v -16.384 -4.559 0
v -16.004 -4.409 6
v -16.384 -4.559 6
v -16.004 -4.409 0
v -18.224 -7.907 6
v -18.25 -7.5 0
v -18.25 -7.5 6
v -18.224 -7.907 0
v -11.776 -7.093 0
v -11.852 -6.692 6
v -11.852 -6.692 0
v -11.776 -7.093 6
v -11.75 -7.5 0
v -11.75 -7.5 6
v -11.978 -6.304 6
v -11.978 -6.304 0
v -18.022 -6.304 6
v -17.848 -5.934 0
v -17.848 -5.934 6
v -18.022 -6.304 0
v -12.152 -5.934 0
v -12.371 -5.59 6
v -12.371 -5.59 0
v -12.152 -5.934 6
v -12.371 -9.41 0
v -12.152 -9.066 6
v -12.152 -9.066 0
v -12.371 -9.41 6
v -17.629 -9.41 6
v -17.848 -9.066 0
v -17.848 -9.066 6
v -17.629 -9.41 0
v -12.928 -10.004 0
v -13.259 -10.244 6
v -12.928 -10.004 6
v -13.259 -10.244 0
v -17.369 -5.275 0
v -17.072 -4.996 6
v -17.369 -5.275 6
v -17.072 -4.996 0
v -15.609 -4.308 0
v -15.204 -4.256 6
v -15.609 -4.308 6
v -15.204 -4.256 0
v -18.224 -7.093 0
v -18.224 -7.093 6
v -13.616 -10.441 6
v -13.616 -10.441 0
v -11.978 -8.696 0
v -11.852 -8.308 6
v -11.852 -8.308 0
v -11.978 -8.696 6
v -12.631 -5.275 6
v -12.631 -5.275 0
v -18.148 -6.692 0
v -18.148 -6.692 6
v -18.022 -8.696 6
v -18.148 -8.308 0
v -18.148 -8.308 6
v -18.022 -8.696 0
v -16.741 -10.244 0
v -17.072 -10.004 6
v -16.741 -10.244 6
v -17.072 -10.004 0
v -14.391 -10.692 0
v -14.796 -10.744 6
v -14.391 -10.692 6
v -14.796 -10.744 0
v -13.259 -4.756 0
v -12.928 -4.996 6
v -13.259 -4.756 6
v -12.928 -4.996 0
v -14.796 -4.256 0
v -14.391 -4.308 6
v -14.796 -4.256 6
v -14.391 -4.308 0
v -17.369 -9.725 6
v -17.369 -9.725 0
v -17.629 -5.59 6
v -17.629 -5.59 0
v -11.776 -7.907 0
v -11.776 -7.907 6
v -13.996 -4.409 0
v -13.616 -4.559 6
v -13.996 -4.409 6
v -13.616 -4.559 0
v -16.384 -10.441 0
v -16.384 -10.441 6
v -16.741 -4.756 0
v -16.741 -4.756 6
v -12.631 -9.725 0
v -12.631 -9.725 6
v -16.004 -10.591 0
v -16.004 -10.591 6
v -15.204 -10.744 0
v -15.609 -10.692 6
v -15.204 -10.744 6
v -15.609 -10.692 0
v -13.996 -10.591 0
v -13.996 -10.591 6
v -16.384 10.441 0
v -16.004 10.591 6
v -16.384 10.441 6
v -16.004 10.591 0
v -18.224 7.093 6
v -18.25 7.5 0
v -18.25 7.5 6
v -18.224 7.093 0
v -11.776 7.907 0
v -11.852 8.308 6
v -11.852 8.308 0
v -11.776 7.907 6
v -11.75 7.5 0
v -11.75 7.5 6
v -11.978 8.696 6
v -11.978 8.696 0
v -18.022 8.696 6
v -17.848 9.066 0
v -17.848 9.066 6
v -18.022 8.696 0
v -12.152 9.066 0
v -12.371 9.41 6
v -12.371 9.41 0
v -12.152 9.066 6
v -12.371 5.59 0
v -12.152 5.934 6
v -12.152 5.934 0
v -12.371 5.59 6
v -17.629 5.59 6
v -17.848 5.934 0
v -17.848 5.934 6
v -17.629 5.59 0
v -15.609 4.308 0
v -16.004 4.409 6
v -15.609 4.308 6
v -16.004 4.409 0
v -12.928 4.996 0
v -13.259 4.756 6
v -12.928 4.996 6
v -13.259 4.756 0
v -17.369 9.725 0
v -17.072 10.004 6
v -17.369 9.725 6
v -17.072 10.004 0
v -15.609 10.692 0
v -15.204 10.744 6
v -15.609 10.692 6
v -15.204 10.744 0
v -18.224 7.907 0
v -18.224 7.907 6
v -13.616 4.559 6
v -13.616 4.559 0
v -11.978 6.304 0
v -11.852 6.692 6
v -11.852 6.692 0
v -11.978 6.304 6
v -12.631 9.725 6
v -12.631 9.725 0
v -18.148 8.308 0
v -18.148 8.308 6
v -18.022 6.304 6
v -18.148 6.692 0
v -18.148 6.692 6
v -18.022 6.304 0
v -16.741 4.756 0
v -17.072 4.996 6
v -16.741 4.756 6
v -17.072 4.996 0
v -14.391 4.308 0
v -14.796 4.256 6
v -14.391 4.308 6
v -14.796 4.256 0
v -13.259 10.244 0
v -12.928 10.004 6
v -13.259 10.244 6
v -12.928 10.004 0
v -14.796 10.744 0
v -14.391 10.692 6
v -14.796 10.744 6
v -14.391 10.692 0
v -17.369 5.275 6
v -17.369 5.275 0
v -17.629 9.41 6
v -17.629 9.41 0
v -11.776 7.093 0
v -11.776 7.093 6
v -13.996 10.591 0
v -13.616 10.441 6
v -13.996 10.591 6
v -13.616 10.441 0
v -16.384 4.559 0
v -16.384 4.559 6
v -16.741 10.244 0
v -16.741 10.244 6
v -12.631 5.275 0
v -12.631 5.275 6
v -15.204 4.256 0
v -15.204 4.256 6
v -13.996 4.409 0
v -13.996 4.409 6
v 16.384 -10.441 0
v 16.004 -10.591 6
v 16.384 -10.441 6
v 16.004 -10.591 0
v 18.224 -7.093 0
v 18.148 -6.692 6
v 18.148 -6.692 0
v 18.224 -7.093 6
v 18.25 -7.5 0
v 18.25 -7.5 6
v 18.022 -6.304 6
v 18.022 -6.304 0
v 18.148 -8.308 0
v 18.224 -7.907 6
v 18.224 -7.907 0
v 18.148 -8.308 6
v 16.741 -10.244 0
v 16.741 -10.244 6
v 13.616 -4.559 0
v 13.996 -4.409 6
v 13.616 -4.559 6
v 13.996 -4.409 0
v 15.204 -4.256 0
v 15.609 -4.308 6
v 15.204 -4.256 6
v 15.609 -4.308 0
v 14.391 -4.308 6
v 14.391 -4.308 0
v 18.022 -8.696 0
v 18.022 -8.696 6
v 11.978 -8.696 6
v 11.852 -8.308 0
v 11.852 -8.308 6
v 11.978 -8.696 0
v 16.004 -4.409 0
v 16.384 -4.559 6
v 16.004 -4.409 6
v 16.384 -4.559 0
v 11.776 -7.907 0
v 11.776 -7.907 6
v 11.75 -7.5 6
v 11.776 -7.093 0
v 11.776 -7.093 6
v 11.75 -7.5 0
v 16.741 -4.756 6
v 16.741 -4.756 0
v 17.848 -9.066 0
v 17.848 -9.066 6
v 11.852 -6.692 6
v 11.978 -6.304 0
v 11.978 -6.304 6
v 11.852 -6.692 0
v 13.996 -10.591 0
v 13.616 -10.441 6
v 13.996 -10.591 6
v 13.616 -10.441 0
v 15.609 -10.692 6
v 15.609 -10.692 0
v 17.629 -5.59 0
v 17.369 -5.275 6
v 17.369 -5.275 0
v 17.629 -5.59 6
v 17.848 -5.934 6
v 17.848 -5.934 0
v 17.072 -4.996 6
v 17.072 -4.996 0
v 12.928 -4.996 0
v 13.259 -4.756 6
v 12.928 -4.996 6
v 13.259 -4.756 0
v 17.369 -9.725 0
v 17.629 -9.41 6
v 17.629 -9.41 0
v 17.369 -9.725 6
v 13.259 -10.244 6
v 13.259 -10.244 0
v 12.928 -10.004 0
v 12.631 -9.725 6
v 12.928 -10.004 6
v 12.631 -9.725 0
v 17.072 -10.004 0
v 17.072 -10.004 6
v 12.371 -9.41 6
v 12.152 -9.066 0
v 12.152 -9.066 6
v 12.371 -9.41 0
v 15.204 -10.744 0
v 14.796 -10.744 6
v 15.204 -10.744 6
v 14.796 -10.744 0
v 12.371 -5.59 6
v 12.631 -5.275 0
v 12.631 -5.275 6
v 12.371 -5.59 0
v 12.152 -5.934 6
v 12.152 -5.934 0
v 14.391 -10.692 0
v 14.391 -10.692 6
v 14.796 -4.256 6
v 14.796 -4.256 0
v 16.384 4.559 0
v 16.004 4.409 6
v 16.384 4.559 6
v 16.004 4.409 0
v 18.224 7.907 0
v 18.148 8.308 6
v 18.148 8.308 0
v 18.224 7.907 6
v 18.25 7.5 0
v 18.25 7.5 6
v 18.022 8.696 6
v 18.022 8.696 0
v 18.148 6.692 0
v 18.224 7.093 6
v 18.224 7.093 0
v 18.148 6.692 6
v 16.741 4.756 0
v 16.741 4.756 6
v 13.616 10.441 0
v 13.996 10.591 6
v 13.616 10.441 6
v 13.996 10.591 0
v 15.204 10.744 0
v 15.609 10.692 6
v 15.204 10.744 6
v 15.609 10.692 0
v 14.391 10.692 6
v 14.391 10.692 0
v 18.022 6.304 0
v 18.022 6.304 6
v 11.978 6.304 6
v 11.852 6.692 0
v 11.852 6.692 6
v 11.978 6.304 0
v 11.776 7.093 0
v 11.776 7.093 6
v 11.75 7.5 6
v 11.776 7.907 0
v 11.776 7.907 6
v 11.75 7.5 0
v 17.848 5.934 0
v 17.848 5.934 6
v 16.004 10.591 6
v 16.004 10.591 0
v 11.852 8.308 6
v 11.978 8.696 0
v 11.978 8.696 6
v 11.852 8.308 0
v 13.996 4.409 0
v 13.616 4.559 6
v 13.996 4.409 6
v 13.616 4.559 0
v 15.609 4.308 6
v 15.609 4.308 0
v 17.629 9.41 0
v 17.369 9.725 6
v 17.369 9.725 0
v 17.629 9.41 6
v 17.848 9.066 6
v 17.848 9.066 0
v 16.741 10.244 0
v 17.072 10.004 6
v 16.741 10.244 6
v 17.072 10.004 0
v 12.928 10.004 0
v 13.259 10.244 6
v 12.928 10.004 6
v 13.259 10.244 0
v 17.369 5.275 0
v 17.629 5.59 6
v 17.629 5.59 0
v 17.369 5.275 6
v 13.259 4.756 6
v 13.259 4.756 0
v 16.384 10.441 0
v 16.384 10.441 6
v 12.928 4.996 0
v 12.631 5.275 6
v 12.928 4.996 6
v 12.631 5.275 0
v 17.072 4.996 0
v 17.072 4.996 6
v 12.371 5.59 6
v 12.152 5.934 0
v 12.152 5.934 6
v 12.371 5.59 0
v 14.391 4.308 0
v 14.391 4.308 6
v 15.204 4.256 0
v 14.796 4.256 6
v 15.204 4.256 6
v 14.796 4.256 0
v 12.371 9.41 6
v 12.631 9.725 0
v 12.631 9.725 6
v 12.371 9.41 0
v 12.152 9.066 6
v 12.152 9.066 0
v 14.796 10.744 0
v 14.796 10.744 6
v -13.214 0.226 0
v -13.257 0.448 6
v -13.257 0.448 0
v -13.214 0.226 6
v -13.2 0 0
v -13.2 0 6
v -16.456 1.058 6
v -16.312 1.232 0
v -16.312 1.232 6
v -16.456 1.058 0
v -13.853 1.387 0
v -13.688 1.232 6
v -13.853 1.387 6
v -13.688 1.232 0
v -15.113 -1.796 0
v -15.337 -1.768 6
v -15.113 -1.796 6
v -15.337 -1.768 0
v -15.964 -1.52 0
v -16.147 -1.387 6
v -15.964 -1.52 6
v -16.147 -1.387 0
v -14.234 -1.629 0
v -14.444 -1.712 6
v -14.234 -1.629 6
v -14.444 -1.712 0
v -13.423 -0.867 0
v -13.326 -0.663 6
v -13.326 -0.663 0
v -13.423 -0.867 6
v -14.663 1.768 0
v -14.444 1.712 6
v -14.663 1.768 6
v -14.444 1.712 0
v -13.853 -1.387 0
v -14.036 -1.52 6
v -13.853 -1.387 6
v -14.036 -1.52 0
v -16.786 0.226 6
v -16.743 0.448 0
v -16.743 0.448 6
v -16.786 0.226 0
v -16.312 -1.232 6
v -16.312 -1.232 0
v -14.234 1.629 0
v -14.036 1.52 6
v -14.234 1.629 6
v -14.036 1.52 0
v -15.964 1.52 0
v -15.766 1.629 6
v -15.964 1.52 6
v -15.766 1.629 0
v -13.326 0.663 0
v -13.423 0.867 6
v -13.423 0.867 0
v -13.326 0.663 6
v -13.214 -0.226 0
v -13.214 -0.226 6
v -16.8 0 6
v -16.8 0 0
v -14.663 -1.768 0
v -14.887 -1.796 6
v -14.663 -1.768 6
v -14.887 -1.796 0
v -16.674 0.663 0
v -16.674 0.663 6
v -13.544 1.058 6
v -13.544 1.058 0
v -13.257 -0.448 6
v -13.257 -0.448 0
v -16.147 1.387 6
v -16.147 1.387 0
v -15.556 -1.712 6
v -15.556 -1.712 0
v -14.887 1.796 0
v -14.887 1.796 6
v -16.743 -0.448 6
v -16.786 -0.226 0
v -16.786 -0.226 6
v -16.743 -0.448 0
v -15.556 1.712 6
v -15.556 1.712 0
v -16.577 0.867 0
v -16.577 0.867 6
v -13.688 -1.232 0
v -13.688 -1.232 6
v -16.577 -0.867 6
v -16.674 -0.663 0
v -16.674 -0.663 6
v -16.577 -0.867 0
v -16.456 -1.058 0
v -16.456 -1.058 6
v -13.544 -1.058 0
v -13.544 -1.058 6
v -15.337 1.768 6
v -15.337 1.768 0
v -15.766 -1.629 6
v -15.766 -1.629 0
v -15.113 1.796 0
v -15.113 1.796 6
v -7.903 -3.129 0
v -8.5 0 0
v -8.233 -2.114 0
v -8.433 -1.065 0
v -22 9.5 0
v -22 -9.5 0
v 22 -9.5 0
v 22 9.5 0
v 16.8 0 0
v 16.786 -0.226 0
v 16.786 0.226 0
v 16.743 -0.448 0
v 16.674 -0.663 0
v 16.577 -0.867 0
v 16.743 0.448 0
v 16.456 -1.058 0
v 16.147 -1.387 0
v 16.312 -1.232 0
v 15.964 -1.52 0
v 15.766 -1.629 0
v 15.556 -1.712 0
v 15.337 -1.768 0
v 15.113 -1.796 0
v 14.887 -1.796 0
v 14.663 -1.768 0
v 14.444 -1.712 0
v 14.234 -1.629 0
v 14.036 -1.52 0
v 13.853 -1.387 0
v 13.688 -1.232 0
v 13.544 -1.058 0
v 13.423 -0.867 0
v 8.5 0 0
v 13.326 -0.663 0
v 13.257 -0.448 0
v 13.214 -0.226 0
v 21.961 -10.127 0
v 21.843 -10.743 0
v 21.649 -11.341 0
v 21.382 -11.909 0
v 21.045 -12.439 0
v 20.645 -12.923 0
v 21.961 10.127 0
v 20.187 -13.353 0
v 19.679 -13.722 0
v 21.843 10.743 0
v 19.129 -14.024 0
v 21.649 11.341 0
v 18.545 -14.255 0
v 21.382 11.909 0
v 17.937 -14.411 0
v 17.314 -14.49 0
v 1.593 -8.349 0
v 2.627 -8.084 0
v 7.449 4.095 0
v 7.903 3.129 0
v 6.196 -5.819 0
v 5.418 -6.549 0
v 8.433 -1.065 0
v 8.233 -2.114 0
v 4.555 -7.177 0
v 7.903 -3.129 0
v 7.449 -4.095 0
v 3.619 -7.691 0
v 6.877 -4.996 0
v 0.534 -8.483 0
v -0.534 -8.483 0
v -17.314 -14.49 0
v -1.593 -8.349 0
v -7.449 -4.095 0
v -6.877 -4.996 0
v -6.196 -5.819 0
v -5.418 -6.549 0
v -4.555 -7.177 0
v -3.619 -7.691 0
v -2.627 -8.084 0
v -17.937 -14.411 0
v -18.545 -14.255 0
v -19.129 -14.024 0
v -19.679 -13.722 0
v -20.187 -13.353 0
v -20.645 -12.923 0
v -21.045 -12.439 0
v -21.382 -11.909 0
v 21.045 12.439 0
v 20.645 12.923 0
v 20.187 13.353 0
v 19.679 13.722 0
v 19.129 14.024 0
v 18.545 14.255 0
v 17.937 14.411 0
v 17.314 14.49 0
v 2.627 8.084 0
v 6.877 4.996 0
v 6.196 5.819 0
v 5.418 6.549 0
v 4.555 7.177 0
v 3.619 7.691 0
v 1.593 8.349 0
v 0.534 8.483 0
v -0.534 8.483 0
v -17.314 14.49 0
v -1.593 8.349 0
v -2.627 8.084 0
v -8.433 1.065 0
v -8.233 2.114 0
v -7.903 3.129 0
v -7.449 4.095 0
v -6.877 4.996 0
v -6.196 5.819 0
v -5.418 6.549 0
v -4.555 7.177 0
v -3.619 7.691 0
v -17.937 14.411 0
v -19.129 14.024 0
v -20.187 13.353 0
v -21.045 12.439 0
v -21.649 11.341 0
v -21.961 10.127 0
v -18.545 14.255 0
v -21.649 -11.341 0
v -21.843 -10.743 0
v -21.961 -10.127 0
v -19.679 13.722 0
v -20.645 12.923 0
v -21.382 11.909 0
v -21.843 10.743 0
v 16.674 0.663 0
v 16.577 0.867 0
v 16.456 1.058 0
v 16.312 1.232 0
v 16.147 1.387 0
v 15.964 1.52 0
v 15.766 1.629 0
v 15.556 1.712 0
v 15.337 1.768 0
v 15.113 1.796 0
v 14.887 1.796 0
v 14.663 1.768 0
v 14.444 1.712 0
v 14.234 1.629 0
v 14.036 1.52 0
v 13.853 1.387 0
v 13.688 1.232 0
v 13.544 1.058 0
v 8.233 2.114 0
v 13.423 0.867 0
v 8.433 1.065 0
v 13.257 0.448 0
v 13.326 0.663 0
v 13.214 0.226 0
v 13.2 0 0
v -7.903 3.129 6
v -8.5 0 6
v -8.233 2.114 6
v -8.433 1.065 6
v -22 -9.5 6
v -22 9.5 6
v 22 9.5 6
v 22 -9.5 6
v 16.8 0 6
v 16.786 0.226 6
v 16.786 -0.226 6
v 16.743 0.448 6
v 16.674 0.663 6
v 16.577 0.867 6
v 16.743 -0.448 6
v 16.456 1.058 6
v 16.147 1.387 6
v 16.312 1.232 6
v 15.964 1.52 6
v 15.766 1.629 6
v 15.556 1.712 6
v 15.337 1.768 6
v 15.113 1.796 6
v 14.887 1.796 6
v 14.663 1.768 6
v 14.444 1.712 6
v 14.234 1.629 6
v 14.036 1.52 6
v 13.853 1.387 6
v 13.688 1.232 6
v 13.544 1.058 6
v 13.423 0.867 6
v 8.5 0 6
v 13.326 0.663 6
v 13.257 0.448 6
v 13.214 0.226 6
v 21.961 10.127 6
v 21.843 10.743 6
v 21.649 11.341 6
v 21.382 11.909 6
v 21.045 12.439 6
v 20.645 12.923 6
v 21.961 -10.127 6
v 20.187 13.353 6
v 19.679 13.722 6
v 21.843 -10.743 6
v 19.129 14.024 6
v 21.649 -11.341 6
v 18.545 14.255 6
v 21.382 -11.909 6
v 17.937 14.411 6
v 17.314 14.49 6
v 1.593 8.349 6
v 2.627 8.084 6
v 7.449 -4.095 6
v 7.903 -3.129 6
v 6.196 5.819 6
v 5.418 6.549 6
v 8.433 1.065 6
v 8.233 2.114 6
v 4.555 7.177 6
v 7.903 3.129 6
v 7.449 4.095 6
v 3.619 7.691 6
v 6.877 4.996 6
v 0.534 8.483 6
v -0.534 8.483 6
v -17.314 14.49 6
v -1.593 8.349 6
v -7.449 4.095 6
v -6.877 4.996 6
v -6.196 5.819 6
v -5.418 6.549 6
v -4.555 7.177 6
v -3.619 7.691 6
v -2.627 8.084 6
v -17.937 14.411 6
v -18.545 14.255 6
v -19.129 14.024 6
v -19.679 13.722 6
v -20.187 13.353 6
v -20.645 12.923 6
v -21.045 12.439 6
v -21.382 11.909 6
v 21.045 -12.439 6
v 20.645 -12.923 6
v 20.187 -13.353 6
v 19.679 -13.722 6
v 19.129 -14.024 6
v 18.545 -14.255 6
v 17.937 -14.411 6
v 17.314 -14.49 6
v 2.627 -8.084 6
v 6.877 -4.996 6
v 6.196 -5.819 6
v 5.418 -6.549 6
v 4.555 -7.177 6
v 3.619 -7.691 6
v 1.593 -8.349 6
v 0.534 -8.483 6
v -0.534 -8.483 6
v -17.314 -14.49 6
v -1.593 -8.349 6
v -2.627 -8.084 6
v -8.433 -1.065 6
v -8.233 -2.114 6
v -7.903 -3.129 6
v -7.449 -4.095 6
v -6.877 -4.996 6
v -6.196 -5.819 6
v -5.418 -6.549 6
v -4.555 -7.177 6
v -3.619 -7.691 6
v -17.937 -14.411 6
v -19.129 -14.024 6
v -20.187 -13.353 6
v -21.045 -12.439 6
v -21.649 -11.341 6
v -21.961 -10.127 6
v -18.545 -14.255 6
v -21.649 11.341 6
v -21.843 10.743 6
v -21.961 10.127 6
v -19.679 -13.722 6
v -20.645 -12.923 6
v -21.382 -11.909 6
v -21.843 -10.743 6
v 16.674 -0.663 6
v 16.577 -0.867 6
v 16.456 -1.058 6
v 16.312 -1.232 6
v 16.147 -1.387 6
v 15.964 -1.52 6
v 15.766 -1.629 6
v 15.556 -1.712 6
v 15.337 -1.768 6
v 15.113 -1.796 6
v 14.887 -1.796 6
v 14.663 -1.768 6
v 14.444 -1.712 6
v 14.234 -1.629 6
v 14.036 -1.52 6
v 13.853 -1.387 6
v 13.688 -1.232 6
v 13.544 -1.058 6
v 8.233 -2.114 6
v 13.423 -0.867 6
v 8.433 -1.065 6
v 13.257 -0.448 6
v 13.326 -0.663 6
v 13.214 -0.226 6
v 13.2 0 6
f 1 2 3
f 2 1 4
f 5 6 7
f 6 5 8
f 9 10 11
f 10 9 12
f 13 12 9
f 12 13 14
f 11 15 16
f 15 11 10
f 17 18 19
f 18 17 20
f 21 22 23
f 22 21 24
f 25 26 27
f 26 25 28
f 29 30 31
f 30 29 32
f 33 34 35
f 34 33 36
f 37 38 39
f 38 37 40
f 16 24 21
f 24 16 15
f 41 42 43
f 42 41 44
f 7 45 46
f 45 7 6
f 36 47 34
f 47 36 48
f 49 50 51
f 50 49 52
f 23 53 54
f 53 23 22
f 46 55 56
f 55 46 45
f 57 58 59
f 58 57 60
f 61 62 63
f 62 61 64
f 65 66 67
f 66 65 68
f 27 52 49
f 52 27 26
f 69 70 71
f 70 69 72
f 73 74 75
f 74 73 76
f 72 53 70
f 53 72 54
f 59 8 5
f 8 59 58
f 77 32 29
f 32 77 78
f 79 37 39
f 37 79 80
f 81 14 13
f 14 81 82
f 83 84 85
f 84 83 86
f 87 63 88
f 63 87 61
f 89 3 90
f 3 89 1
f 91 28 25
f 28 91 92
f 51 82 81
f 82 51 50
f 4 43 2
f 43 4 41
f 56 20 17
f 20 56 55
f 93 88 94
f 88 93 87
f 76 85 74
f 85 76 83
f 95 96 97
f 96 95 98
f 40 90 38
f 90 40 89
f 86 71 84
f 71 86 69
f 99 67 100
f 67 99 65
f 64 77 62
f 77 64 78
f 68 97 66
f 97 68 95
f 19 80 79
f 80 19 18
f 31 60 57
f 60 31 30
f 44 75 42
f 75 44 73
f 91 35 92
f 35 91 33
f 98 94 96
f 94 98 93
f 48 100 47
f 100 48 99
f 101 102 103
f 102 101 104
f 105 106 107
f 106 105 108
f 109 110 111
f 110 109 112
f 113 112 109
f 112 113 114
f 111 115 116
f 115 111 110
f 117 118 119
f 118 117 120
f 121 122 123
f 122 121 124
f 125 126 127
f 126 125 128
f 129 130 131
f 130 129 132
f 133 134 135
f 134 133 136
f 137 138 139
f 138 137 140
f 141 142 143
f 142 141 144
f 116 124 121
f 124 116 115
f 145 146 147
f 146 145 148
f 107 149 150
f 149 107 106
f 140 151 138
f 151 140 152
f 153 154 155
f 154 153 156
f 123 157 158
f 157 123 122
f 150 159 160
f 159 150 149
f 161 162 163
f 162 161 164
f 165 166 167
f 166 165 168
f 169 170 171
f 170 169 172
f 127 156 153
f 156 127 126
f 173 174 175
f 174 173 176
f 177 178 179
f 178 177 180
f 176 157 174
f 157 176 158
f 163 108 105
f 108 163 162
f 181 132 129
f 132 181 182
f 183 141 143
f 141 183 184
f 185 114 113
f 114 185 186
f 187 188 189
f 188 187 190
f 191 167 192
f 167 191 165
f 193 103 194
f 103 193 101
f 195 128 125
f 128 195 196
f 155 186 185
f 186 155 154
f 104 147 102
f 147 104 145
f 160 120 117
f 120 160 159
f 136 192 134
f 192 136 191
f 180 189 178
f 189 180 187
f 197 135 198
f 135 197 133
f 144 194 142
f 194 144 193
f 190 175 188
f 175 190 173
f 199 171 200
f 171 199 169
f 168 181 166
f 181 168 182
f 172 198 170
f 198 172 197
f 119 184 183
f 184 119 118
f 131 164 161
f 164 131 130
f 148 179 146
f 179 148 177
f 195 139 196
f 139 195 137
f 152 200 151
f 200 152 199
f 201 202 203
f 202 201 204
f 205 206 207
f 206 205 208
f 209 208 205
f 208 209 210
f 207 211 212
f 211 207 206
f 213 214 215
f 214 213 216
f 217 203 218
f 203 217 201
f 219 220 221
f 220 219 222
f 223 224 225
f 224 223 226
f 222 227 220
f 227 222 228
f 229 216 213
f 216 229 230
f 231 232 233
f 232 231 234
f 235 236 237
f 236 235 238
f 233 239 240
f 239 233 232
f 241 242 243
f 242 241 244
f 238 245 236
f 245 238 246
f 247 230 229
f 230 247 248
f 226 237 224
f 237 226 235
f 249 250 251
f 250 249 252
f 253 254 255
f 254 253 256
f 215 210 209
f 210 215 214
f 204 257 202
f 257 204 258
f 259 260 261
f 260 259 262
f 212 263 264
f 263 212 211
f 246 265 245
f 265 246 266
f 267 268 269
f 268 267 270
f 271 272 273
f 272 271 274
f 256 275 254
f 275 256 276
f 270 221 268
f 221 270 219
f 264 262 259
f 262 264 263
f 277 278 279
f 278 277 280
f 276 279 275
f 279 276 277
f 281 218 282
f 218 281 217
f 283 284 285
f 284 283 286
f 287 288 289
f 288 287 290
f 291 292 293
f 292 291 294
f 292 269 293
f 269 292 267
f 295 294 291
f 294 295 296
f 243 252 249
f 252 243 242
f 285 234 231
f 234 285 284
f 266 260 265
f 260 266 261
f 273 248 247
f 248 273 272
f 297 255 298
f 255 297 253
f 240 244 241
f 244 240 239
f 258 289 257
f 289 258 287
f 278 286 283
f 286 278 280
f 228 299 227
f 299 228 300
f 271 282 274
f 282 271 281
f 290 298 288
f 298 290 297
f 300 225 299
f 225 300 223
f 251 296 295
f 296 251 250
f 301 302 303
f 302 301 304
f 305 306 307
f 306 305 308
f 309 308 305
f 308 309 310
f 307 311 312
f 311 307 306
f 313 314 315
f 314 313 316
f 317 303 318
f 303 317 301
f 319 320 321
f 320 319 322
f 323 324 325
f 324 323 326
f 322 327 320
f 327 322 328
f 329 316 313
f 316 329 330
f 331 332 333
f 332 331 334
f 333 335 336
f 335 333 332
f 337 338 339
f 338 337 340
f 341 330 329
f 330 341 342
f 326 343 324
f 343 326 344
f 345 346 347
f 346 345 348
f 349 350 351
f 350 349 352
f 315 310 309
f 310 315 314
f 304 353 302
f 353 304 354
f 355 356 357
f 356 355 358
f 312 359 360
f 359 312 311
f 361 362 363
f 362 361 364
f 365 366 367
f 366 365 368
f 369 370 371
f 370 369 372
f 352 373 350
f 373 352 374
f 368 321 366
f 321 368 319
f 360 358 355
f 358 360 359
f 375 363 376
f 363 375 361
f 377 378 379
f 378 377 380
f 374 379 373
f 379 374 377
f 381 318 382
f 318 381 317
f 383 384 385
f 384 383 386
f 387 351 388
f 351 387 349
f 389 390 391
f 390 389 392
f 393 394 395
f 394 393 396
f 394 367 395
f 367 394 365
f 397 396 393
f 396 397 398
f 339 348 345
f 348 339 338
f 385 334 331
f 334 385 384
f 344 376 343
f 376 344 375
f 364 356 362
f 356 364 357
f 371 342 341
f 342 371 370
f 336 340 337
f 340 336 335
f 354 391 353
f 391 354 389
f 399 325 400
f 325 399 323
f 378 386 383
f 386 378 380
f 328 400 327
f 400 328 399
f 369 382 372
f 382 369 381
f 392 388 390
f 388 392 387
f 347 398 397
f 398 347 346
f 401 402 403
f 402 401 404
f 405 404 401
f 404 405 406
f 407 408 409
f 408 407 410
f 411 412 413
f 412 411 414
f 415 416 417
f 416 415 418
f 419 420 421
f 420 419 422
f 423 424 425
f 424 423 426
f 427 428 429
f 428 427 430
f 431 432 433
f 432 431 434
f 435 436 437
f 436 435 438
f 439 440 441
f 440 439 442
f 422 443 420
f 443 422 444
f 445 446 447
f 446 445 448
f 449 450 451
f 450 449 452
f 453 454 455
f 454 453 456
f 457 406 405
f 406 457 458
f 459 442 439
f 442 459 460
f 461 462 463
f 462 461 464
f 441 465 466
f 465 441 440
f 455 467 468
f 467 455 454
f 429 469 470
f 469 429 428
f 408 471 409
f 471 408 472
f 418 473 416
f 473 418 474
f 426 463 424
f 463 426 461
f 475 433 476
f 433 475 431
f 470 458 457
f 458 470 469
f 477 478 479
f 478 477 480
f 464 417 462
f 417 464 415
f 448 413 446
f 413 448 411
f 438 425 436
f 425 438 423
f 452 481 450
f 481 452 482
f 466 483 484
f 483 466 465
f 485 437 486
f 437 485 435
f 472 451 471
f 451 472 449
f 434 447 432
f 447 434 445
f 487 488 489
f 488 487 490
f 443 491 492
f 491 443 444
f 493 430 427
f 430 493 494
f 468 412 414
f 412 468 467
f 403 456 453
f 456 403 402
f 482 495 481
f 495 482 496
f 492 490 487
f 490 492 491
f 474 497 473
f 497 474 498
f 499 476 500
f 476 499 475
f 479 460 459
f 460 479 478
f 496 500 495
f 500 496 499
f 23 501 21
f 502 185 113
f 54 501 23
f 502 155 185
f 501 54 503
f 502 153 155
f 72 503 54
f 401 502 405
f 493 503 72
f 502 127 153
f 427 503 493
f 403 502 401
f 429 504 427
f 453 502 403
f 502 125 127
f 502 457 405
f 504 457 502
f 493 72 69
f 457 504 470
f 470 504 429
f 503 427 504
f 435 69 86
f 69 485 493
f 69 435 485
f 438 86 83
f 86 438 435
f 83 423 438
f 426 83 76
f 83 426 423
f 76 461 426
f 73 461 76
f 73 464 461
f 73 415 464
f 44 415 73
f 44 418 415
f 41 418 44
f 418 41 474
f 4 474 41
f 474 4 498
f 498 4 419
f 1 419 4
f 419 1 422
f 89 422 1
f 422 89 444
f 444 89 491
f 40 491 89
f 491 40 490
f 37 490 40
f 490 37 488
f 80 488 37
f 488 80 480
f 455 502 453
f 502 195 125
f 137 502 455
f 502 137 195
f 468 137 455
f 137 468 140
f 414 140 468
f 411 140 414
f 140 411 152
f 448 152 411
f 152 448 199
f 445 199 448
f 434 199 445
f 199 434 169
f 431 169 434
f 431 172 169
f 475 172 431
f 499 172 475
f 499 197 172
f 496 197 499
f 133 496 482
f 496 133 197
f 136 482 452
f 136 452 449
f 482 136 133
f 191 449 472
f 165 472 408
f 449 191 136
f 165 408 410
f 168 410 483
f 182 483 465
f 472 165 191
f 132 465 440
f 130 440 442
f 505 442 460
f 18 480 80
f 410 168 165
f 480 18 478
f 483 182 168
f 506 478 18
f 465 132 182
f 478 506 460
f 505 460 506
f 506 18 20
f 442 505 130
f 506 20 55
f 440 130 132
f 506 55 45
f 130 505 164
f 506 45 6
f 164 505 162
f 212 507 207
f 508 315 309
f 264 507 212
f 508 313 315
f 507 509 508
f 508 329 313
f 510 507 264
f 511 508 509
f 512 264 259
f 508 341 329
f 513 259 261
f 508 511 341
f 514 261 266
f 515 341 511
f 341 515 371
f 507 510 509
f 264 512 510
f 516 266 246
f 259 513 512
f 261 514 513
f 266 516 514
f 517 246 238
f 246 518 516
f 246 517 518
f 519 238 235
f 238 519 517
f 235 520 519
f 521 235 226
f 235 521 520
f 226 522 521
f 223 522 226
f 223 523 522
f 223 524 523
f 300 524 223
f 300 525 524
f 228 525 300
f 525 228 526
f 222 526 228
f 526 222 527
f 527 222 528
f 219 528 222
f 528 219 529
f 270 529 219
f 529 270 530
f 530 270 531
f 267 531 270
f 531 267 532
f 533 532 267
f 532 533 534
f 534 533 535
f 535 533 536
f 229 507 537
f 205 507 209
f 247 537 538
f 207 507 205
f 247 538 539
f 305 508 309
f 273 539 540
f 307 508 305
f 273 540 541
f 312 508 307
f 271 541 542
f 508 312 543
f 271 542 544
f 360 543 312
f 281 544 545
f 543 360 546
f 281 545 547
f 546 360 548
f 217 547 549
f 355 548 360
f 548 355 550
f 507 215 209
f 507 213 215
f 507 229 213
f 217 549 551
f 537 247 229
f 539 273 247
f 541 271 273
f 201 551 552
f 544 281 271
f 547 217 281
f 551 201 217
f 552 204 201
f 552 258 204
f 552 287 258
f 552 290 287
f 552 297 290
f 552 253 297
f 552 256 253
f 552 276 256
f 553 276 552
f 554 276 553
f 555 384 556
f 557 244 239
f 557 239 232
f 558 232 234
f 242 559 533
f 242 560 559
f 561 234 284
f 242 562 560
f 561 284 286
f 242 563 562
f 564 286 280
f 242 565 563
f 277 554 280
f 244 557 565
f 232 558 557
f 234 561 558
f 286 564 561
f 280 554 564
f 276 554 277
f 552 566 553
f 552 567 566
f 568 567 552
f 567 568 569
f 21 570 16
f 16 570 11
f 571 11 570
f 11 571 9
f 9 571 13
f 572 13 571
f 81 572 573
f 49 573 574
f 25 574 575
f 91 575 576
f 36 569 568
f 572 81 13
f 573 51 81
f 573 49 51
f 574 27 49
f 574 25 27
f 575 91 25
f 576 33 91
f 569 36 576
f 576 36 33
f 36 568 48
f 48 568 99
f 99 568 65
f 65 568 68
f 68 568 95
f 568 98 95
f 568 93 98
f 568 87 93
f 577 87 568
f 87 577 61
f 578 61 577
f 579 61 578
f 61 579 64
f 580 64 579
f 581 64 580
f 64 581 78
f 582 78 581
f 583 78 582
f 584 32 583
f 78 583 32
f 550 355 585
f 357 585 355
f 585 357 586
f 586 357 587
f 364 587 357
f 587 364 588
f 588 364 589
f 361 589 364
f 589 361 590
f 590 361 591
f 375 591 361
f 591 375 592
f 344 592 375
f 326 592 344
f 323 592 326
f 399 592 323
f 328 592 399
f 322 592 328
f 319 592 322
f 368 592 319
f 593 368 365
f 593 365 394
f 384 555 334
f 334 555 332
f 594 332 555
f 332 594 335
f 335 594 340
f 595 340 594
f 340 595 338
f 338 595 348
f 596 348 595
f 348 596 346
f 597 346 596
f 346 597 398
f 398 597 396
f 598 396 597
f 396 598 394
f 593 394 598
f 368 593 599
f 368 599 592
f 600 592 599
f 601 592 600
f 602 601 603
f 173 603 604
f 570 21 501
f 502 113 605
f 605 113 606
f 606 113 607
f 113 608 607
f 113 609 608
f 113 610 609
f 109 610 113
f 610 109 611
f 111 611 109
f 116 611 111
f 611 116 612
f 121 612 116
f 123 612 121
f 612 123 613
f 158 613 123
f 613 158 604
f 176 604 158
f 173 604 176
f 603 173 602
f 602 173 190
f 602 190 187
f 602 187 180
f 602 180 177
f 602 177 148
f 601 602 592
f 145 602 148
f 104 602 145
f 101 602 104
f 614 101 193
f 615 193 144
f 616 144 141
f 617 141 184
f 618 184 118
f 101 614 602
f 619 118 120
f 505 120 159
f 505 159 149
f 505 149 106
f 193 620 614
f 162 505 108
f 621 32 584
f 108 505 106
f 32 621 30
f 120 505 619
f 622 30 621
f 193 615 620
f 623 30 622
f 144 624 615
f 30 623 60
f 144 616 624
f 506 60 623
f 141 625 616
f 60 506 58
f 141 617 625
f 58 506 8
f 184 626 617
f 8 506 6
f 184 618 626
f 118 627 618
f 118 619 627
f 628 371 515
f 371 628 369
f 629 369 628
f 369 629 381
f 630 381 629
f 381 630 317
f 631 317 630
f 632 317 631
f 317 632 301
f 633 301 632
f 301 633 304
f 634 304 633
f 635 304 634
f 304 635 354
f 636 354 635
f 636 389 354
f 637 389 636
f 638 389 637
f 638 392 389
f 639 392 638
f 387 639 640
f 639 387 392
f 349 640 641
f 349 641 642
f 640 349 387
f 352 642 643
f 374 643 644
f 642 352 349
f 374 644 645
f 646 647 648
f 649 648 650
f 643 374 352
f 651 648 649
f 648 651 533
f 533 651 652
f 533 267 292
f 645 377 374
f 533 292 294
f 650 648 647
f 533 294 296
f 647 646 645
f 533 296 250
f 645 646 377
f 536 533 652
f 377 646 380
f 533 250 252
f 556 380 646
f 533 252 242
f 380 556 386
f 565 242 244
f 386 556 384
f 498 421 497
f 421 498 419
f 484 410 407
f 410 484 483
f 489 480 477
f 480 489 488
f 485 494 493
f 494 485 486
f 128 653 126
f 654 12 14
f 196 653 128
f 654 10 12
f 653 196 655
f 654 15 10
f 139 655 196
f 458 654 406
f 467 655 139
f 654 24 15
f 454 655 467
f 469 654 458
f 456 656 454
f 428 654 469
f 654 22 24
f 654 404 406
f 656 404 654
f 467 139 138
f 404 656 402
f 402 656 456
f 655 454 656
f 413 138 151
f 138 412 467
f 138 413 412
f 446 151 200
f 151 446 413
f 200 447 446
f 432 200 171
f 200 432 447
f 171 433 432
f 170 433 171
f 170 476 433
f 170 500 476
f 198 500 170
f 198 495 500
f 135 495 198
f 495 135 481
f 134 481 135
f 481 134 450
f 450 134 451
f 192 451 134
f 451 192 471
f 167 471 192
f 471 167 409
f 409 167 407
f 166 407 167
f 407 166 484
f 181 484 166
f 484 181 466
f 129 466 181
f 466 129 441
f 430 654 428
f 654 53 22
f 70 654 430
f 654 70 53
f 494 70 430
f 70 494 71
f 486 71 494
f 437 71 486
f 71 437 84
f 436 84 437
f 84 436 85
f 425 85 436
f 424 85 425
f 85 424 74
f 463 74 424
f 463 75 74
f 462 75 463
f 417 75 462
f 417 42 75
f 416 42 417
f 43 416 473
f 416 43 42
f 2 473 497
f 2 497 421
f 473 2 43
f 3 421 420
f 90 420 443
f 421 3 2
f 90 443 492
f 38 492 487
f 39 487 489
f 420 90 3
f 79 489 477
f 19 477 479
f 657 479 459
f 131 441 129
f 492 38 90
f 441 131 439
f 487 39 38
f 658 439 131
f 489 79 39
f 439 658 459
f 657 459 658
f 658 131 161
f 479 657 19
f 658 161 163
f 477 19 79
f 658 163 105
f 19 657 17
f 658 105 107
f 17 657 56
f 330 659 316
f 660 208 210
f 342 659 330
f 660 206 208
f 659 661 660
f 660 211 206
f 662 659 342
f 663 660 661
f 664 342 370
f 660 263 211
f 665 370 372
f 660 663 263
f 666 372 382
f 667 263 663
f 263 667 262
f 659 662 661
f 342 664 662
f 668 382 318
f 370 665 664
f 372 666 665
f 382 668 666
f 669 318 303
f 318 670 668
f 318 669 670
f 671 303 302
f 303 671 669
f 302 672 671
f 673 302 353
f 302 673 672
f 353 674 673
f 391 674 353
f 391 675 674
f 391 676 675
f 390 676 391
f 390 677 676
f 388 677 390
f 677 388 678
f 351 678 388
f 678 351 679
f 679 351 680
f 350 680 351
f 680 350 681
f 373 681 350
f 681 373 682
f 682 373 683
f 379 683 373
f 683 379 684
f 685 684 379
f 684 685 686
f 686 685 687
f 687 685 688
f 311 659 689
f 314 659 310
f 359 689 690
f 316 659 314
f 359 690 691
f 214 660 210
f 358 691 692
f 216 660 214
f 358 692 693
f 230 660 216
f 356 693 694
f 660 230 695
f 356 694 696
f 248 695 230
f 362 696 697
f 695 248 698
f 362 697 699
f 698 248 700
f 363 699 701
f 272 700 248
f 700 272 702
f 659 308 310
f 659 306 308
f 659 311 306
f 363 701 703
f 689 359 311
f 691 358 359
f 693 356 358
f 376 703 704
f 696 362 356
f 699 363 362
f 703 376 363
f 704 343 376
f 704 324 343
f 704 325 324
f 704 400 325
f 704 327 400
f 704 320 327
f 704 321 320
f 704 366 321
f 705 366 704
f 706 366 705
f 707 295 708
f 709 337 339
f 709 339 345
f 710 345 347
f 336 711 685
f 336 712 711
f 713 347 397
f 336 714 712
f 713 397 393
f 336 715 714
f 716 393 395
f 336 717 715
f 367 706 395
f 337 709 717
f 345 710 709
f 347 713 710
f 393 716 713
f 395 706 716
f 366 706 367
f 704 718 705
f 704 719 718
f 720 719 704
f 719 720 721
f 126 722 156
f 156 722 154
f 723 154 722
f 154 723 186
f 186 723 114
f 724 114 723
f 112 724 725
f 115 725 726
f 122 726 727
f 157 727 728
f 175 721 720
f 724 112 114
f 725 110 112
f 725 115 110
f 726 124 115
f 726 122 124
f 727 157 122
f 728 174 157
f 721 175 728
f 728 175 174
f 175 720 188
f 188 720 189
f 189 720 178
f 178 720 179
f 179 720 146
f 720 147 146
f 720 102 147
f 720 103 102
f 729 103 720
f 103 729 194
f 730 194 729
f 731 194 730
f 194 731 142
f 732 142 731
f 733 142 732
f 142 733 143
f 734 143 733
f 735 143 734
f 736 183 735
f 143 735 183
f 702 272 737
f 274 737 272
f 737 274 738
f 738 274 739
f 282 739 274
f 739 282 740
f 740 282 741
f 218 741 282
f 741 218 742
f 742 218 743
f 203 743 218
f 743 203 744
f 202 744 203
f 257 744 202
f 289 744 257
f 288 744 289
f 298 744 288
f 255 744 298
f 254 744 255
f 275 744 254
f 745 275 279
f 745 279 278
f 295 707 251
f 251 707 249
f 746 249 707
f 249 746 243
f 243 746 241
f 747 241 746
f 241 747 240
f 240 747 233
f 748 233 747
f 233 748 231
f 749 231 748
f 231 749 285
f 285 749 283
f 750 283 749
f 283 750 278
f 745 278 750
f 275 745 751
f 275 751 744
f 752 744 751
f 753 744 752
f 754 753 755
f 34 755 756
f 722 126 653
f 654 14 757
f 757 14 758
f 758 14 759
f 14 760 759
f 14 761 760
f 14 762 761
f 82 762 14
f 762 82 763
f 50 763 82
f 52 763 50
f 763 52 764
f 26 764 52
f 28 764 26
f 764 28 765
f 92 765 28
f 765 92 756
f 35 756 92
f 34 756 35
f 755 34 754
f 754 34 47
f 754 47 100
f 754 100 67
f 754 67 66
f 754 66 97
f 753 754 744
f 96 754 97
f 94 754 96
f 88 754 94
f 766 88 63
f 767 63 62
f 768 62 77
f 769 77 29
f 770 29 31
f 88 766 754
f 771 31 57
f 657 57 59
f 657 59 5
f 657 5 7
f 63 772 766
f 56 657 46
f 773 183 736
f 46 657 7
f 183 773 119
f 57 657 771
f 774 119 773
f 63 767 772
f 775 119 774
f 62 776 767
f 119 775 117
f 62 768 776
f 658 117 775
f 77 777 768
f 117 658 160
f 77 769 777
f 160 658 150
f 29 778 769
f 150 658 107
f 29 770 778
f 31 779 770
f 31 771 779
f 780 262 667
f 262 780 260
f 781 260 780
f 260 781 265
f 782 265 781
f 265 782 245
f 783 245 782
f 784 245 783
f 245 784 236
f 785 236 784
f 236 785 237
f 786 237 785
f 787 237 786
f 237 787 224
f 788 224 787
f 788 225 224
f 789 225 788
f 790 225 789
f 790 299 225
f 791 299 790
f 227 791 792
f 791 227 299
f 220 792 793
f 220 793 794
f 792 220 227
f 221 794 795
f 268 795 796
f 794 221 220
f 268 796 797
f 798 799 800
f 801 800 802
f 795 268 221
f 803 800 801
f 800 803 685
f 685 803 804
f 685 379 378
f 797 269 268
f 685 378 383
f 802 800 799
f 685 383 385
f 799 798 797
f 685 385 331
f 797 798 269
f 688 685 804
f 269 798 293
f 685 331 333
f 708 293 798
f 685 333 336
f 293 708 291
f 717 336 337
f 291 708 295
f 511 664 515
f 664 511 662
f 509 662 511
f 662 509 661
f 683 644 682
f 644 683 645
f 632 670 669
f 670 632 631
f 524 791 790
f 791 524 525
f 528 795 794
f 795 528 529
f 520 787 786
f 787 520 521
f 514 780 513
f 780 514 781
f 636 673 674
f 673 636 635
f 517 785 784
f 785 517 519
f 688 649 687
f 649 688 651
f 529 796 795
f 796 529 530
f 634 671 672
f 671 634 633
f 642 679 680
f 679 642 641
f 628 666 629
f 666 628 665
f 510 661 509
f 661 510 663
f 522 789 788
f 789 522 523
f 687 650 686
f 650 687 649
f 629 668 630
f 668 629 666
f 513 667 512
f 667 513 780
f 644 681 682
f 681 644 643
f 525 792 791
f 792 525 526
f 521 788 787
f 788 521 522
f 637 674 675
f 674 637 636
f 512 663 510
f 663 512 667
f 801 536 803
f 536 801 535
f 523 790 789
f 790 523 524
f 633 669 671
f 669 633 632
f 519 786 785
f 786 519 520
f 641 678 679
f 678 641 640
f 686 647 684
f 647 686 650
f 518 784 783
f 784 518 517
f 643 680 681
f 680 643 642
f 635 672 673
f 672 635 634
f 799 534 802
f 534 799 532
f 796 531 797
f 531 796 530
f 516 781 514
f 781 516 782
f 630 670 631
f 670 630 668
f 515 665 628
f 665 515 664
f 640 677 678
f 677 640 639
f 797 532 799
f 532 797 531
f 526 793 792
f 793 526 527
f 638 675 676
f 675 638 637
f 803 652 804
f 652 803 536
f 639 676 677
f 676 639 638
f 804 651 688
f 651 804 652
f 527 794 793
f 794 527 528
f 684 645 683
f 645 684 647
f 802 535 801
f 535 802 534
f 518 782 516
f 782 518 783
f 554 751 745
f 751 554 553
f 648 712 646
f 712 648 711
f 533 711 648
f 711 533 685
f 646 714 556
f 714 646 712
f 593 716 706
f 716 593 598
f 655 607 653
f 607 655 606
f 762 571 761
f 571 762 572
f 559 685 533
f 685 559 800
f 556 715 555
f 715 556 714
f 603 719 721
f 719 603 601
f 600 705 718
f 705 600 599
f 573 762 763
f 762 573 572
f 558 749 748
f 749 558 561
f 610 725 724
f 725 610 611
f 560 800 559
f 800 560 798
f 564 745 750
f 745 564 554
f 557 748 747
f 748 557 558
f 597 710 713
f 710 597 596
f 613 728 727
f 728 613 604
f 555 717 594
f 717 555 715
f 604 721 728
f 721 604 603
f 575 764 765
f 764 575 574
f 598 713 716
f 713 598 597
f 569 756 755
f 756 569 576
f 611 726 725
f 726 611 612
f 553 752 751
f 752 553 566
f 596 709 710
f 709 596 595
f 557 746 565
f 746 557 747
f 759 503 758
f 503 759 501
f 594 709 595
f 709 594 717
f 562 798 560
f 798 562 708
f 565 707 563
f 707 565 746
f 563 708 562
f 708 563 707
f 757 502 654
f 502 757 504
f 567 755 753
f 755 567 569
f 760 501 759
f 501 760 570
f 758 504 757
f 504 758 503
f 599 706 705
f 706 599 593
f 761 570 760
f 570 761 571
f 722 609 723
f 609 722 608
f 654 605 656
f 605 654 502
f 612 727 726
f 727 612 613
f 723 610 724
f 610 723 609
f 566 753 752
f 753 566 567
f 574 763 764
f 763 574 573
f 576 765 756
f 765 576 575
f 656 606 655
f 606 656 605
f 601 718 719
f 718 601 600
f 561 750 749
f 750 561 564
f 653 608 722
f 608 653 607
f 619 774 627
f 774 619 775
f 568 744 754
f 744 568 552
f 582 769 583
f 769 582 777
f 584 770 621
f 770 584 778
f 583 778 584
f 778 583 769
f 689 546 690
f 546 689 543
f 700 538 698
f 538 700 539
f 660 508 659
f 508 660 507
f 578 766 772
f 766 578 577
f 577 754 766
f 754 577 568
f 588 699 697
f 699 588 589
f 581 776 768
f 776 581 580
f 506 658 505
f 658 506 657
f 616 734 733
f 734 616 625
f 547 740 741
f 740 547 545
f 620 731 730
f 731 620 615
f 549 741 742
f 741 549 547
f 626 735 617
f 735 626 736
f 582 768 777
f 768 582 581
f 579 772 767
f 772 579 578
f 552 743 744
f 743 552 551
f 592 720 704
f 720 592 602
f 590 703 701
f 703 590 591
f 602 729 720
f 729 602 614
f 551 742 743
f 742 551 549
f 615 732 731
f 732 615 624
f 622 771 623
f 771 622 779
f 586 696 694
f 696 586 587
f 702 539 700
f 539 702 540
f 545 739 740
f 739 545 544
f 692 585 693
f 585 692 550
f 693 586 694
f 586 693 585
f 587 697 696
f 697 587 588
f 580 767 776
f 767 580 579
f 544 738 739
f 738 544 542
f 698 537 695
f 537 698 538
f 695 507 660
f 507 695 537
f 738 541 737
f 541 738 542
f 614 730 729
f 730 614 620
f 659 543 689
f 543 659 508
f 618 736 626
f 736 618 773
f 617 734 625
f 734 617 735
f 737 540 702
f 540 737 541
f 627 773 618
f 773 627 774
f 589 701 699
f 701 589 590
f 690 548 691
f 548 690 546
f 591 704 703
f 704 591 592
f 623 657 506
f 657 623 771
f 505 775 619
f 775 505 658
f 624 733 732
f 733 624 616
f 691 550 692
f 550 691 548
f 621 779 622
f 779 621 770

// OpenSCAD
$fn = 50;


difference() {
	union() {
		hull() {
			translate(v = [-17.0000000000, 9.5000000000, 0]) {
				cylinder(h = 6, r = 5);
			}
			translate(v = [17.0000000000, 9.5000000000, 0]) {
				cylinder(h = 6, r = 5);
			}
			translate(v = [-17.0000000000, -9.5000000000, 0]) {
				cylinder(h = 6, r = 5);
			}
			translate(v = [17.0000000000, -9.5000000000, 0]) {
				cylinder(h = 6, r = 5);
			}
		}
	}
	union() {
		#translate(v = [-15.0000000000, -7.5000000000, 0]) {
			cylinder(h = 6, r = 3.2500000000);
		}
		#translate(v = [-15.0000000000, 7.5000000000, 0]) {
			cylinder(h = 6, r = 3.2500000000);
		}
		#translate(v = [15.0000000000, -7.5000000000, 0]) {
			cylinder(h = 6, r = 3.2500000000);
		}
		#translate(v = [15.0000000000, 7.5000000000, 0]) {
			cylinder(h = 6, r = 3.2500000000);
		}
		#translate(v = [-15.0000000000, -7.5000000000, -100.0000000000]) {
			cylinder(h = 200, r = 3.2500000000);
		}
		#translate(v = [-15.0000000000, 7.5000000000, -100.0000000000]) {
			cylinder(h = 200, r = 3.2500000000);
		}
		#translate(v = [15.0000000000, -7.5000000000, -100.0000000000]) {
			cylinder(h = 200, r = 3.2500000000);
		}
		#translate(v = [15.0000000000, 7.5000000000, -100.0000000000]) {
			cylinder(h = 200, r = 3.2500000000);
		}
		#translate(v = [-15.0000000000, -7.5000000000, 0]) {
			cylinder(h = 6, r = 1.8000000000);
		}
		#translate(v = [-15.0000000000, 0.0000000000, 0]) {
			cylinder(h = 6, r = 1.8000000000);
		}
		#translate(v = [-15.0000000000, 7.5000000000, 0]) {
			cylinder(h = 6, r = 1.8000000000);
		}
		#translate(v = [15.0000000000, -7.5000000000, 0]) {
			cylinder(h = 6, r = 1.8000000000);
		}
		#translate(v = [15.0000000000, 0.0000000000, 0]) {
			cylinder(h = 6, r = 1.8000000000);
		}
		#translate(v = [15.0000000000, 7.5000000000, 0]) {
			cylinder(h = 6, r = 1.8000000000);
		}
		#translate(v = [-15.0000000000, -7.5000000000, 0]) {
			cylinder(h = 6, r = 1.8000000000);
		}
		#translate(v = [-15.0000000000, 0.0000000000, 0]) {
			cylinder(h = 6, r = 1.8000000000);
		}
		#translate(v = [-15.0000000000, 7.5000000000, 0]) {
			cylinder(h = 6, r = 1.8000000000);
		}
		#translate(v = [15.0000000000, -7.5000000000, 0]) {
			cylinder(h = 6, r = 1.8000000000);
		}
		#translate(v = [15.0000000000, 0.0000000000, 0]) {
			cylinder(h = 6, r = 1.8000000000);
		}
		#translate(v = [15.0000000000, 7.5000000000, 0]) {
			cylinder(h = 6, r = 1.8000000000);
		}
		#translate(v = [-15.0000000000, -7.5000000000, 0]) {
			cylinder(h = 6, r = 1.8000000000);
		}
		#translate(v = [-15.0000000000, 0.0000000000, 0]) {
			cylinder(h = 6, r = 1.8000000000);
		}
		#translate(v = [-15.0000000000, 7.5000000000, 0]) {
			cylinder(h = 6, r = 1.8000000000);
		}
		#translate(v = [15.0000000000, -7.5000000000, 0]) {
			cylinder(h = 6, r = 1.8000000000);
		}
		#translate(v = [15.0000000000, 0.0000000000, 0]) {
			cylinder(h = 6, r = 1.8000000000);
		}
		#translate(v = [15.0000000000, 7.5000000000, 0]) {
			cylinder(h = 6, r = 1.8000000000);
		}
		#cylinder(h = 6, r = 8.5000000000);
	}
}
